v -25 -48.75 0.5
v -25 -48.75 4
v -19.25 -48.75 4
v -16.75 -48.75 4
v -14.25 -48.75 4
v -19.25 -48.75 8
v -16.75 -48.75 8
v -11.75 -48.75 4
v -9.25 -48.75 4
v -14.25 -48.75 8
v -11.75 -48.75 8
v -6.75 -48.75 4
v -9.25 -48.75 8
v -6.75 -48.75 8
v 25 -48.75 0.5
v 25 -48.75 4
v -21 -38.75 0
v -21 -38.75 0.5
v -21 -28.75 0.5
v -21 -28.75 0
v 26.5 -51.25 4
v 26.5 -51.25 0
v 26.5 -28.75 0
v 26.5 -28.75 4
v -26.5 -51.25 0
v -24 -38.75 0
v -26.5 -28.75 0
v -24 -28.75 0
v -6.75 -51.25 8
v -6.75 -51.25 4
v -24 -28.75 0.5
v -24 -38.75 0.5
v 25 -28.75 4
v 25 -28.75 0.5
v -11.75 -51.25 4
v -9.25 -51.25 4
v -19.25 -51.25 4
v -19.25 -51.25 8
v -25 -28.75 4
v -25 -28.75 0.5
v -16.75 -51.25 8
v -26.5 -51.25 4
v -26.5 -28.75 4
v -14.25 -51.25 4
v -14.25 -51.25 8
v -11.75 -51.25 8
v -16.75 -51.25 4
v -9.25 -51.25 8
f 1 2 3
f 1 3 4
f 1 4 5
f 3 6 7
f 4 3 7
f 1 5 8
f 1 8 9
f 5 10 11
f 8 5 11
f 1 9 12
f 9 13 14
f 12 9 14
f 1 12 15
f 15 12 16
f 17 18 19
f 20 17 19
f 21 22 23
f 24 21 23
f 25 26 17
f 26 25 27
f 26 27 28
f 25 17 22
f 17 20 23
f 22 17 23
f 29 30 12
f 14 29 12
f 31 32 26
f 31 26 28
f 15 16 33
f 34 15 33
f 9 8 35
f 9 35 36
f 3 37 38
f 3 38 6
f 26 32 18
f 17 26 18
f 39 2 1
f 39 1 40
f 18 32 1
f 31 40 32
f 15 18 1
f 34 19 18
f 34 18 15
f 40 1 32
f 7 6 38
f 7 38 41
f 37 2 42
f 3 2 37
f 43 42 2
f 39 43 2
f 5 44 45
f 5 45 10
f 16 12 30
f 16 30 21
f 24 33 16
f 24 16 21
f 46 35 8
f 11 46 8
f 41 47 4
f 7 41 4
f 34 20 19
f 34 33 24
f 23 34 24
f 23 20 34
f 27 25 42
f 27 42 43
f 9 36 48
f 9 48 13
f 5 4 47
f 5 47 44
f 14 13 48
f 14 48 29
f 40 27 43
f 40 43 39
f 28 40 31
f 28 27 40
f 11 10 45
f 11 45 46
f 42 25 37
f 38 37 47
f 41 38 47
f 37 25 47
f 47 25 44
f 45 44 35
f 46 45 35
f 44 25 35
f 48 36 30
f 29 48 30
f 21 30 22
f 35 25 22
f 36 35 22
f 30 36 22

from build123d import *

# Parameters (mm, degrees)
SKETCH010_W     = 53
SKETCH010_H     = 22.5
PAD006_DEPTH    = 4
SKETCH011_W     = 50
SKETCH011_H     = 20
POCKET004_DEPTH = 3.5
SKETCH012_W     = 2.5
SKETCH012_H     = 2.5
PAD007_DEPTH    = 4
SKETCH016_W     = 3
SKETCH016_H     = 10
POCKET006_DEPTH = 0.501


with BuildPart() as part:
    # Sketch010 → Pad006 (new body)
    with BuildSketch(Plane.XY):
        Rectangle(SKETCH010_W, SKETCH010_H)
    extrude(amount=PAD006_DEPTH)

    # Sketch011 (on Face6 of Pad006) → Pocket004 (cut)
    with BuildSketch(Plane.XY.offset(4)):
        with Locations((0, 1.25)):
            Rectangle(SKETCH011_W, SKETCH011_H)
    extrude(amount=-POCKET004_DEPTH, mode=Mode.SUBTRACT)

    # Sketch012 (on Face4 of Pocket004) → Pad007 (join)
    with BuildSketch(Plane.XY.offset(4)):
        with Locations((-18, -10)):
            Rectangle(SKETCH012_W, SKETCH012_H)
        with Locations((-13, -10)):
            Rectangle(SKETCH012_W, SKETCH012_H)
        with Locations((-8, -10)):
            Rectangle(SKETCH012_W, SKETCH012_H)
    extrude(amount=PAD007_DEPTH)

    # Sketch016 (on Face6 of Pad007) → Pocket006 (cut, through all)
    with BuildSketch(Plane.XY.offset(0.5)):
        with Locations((-22.5, 6.25)):
            Rectangle(SKETCH016_W, SKETCH016_H)
    extrude(amount=-POCKET006_DEPTH, mode=Mode.SUBTRACT)


with BuildPart() as part_1:
    # Body003 placement: moved
    add(part.part.moved(Location((0, -40, 0))))


solid = part_1.part
